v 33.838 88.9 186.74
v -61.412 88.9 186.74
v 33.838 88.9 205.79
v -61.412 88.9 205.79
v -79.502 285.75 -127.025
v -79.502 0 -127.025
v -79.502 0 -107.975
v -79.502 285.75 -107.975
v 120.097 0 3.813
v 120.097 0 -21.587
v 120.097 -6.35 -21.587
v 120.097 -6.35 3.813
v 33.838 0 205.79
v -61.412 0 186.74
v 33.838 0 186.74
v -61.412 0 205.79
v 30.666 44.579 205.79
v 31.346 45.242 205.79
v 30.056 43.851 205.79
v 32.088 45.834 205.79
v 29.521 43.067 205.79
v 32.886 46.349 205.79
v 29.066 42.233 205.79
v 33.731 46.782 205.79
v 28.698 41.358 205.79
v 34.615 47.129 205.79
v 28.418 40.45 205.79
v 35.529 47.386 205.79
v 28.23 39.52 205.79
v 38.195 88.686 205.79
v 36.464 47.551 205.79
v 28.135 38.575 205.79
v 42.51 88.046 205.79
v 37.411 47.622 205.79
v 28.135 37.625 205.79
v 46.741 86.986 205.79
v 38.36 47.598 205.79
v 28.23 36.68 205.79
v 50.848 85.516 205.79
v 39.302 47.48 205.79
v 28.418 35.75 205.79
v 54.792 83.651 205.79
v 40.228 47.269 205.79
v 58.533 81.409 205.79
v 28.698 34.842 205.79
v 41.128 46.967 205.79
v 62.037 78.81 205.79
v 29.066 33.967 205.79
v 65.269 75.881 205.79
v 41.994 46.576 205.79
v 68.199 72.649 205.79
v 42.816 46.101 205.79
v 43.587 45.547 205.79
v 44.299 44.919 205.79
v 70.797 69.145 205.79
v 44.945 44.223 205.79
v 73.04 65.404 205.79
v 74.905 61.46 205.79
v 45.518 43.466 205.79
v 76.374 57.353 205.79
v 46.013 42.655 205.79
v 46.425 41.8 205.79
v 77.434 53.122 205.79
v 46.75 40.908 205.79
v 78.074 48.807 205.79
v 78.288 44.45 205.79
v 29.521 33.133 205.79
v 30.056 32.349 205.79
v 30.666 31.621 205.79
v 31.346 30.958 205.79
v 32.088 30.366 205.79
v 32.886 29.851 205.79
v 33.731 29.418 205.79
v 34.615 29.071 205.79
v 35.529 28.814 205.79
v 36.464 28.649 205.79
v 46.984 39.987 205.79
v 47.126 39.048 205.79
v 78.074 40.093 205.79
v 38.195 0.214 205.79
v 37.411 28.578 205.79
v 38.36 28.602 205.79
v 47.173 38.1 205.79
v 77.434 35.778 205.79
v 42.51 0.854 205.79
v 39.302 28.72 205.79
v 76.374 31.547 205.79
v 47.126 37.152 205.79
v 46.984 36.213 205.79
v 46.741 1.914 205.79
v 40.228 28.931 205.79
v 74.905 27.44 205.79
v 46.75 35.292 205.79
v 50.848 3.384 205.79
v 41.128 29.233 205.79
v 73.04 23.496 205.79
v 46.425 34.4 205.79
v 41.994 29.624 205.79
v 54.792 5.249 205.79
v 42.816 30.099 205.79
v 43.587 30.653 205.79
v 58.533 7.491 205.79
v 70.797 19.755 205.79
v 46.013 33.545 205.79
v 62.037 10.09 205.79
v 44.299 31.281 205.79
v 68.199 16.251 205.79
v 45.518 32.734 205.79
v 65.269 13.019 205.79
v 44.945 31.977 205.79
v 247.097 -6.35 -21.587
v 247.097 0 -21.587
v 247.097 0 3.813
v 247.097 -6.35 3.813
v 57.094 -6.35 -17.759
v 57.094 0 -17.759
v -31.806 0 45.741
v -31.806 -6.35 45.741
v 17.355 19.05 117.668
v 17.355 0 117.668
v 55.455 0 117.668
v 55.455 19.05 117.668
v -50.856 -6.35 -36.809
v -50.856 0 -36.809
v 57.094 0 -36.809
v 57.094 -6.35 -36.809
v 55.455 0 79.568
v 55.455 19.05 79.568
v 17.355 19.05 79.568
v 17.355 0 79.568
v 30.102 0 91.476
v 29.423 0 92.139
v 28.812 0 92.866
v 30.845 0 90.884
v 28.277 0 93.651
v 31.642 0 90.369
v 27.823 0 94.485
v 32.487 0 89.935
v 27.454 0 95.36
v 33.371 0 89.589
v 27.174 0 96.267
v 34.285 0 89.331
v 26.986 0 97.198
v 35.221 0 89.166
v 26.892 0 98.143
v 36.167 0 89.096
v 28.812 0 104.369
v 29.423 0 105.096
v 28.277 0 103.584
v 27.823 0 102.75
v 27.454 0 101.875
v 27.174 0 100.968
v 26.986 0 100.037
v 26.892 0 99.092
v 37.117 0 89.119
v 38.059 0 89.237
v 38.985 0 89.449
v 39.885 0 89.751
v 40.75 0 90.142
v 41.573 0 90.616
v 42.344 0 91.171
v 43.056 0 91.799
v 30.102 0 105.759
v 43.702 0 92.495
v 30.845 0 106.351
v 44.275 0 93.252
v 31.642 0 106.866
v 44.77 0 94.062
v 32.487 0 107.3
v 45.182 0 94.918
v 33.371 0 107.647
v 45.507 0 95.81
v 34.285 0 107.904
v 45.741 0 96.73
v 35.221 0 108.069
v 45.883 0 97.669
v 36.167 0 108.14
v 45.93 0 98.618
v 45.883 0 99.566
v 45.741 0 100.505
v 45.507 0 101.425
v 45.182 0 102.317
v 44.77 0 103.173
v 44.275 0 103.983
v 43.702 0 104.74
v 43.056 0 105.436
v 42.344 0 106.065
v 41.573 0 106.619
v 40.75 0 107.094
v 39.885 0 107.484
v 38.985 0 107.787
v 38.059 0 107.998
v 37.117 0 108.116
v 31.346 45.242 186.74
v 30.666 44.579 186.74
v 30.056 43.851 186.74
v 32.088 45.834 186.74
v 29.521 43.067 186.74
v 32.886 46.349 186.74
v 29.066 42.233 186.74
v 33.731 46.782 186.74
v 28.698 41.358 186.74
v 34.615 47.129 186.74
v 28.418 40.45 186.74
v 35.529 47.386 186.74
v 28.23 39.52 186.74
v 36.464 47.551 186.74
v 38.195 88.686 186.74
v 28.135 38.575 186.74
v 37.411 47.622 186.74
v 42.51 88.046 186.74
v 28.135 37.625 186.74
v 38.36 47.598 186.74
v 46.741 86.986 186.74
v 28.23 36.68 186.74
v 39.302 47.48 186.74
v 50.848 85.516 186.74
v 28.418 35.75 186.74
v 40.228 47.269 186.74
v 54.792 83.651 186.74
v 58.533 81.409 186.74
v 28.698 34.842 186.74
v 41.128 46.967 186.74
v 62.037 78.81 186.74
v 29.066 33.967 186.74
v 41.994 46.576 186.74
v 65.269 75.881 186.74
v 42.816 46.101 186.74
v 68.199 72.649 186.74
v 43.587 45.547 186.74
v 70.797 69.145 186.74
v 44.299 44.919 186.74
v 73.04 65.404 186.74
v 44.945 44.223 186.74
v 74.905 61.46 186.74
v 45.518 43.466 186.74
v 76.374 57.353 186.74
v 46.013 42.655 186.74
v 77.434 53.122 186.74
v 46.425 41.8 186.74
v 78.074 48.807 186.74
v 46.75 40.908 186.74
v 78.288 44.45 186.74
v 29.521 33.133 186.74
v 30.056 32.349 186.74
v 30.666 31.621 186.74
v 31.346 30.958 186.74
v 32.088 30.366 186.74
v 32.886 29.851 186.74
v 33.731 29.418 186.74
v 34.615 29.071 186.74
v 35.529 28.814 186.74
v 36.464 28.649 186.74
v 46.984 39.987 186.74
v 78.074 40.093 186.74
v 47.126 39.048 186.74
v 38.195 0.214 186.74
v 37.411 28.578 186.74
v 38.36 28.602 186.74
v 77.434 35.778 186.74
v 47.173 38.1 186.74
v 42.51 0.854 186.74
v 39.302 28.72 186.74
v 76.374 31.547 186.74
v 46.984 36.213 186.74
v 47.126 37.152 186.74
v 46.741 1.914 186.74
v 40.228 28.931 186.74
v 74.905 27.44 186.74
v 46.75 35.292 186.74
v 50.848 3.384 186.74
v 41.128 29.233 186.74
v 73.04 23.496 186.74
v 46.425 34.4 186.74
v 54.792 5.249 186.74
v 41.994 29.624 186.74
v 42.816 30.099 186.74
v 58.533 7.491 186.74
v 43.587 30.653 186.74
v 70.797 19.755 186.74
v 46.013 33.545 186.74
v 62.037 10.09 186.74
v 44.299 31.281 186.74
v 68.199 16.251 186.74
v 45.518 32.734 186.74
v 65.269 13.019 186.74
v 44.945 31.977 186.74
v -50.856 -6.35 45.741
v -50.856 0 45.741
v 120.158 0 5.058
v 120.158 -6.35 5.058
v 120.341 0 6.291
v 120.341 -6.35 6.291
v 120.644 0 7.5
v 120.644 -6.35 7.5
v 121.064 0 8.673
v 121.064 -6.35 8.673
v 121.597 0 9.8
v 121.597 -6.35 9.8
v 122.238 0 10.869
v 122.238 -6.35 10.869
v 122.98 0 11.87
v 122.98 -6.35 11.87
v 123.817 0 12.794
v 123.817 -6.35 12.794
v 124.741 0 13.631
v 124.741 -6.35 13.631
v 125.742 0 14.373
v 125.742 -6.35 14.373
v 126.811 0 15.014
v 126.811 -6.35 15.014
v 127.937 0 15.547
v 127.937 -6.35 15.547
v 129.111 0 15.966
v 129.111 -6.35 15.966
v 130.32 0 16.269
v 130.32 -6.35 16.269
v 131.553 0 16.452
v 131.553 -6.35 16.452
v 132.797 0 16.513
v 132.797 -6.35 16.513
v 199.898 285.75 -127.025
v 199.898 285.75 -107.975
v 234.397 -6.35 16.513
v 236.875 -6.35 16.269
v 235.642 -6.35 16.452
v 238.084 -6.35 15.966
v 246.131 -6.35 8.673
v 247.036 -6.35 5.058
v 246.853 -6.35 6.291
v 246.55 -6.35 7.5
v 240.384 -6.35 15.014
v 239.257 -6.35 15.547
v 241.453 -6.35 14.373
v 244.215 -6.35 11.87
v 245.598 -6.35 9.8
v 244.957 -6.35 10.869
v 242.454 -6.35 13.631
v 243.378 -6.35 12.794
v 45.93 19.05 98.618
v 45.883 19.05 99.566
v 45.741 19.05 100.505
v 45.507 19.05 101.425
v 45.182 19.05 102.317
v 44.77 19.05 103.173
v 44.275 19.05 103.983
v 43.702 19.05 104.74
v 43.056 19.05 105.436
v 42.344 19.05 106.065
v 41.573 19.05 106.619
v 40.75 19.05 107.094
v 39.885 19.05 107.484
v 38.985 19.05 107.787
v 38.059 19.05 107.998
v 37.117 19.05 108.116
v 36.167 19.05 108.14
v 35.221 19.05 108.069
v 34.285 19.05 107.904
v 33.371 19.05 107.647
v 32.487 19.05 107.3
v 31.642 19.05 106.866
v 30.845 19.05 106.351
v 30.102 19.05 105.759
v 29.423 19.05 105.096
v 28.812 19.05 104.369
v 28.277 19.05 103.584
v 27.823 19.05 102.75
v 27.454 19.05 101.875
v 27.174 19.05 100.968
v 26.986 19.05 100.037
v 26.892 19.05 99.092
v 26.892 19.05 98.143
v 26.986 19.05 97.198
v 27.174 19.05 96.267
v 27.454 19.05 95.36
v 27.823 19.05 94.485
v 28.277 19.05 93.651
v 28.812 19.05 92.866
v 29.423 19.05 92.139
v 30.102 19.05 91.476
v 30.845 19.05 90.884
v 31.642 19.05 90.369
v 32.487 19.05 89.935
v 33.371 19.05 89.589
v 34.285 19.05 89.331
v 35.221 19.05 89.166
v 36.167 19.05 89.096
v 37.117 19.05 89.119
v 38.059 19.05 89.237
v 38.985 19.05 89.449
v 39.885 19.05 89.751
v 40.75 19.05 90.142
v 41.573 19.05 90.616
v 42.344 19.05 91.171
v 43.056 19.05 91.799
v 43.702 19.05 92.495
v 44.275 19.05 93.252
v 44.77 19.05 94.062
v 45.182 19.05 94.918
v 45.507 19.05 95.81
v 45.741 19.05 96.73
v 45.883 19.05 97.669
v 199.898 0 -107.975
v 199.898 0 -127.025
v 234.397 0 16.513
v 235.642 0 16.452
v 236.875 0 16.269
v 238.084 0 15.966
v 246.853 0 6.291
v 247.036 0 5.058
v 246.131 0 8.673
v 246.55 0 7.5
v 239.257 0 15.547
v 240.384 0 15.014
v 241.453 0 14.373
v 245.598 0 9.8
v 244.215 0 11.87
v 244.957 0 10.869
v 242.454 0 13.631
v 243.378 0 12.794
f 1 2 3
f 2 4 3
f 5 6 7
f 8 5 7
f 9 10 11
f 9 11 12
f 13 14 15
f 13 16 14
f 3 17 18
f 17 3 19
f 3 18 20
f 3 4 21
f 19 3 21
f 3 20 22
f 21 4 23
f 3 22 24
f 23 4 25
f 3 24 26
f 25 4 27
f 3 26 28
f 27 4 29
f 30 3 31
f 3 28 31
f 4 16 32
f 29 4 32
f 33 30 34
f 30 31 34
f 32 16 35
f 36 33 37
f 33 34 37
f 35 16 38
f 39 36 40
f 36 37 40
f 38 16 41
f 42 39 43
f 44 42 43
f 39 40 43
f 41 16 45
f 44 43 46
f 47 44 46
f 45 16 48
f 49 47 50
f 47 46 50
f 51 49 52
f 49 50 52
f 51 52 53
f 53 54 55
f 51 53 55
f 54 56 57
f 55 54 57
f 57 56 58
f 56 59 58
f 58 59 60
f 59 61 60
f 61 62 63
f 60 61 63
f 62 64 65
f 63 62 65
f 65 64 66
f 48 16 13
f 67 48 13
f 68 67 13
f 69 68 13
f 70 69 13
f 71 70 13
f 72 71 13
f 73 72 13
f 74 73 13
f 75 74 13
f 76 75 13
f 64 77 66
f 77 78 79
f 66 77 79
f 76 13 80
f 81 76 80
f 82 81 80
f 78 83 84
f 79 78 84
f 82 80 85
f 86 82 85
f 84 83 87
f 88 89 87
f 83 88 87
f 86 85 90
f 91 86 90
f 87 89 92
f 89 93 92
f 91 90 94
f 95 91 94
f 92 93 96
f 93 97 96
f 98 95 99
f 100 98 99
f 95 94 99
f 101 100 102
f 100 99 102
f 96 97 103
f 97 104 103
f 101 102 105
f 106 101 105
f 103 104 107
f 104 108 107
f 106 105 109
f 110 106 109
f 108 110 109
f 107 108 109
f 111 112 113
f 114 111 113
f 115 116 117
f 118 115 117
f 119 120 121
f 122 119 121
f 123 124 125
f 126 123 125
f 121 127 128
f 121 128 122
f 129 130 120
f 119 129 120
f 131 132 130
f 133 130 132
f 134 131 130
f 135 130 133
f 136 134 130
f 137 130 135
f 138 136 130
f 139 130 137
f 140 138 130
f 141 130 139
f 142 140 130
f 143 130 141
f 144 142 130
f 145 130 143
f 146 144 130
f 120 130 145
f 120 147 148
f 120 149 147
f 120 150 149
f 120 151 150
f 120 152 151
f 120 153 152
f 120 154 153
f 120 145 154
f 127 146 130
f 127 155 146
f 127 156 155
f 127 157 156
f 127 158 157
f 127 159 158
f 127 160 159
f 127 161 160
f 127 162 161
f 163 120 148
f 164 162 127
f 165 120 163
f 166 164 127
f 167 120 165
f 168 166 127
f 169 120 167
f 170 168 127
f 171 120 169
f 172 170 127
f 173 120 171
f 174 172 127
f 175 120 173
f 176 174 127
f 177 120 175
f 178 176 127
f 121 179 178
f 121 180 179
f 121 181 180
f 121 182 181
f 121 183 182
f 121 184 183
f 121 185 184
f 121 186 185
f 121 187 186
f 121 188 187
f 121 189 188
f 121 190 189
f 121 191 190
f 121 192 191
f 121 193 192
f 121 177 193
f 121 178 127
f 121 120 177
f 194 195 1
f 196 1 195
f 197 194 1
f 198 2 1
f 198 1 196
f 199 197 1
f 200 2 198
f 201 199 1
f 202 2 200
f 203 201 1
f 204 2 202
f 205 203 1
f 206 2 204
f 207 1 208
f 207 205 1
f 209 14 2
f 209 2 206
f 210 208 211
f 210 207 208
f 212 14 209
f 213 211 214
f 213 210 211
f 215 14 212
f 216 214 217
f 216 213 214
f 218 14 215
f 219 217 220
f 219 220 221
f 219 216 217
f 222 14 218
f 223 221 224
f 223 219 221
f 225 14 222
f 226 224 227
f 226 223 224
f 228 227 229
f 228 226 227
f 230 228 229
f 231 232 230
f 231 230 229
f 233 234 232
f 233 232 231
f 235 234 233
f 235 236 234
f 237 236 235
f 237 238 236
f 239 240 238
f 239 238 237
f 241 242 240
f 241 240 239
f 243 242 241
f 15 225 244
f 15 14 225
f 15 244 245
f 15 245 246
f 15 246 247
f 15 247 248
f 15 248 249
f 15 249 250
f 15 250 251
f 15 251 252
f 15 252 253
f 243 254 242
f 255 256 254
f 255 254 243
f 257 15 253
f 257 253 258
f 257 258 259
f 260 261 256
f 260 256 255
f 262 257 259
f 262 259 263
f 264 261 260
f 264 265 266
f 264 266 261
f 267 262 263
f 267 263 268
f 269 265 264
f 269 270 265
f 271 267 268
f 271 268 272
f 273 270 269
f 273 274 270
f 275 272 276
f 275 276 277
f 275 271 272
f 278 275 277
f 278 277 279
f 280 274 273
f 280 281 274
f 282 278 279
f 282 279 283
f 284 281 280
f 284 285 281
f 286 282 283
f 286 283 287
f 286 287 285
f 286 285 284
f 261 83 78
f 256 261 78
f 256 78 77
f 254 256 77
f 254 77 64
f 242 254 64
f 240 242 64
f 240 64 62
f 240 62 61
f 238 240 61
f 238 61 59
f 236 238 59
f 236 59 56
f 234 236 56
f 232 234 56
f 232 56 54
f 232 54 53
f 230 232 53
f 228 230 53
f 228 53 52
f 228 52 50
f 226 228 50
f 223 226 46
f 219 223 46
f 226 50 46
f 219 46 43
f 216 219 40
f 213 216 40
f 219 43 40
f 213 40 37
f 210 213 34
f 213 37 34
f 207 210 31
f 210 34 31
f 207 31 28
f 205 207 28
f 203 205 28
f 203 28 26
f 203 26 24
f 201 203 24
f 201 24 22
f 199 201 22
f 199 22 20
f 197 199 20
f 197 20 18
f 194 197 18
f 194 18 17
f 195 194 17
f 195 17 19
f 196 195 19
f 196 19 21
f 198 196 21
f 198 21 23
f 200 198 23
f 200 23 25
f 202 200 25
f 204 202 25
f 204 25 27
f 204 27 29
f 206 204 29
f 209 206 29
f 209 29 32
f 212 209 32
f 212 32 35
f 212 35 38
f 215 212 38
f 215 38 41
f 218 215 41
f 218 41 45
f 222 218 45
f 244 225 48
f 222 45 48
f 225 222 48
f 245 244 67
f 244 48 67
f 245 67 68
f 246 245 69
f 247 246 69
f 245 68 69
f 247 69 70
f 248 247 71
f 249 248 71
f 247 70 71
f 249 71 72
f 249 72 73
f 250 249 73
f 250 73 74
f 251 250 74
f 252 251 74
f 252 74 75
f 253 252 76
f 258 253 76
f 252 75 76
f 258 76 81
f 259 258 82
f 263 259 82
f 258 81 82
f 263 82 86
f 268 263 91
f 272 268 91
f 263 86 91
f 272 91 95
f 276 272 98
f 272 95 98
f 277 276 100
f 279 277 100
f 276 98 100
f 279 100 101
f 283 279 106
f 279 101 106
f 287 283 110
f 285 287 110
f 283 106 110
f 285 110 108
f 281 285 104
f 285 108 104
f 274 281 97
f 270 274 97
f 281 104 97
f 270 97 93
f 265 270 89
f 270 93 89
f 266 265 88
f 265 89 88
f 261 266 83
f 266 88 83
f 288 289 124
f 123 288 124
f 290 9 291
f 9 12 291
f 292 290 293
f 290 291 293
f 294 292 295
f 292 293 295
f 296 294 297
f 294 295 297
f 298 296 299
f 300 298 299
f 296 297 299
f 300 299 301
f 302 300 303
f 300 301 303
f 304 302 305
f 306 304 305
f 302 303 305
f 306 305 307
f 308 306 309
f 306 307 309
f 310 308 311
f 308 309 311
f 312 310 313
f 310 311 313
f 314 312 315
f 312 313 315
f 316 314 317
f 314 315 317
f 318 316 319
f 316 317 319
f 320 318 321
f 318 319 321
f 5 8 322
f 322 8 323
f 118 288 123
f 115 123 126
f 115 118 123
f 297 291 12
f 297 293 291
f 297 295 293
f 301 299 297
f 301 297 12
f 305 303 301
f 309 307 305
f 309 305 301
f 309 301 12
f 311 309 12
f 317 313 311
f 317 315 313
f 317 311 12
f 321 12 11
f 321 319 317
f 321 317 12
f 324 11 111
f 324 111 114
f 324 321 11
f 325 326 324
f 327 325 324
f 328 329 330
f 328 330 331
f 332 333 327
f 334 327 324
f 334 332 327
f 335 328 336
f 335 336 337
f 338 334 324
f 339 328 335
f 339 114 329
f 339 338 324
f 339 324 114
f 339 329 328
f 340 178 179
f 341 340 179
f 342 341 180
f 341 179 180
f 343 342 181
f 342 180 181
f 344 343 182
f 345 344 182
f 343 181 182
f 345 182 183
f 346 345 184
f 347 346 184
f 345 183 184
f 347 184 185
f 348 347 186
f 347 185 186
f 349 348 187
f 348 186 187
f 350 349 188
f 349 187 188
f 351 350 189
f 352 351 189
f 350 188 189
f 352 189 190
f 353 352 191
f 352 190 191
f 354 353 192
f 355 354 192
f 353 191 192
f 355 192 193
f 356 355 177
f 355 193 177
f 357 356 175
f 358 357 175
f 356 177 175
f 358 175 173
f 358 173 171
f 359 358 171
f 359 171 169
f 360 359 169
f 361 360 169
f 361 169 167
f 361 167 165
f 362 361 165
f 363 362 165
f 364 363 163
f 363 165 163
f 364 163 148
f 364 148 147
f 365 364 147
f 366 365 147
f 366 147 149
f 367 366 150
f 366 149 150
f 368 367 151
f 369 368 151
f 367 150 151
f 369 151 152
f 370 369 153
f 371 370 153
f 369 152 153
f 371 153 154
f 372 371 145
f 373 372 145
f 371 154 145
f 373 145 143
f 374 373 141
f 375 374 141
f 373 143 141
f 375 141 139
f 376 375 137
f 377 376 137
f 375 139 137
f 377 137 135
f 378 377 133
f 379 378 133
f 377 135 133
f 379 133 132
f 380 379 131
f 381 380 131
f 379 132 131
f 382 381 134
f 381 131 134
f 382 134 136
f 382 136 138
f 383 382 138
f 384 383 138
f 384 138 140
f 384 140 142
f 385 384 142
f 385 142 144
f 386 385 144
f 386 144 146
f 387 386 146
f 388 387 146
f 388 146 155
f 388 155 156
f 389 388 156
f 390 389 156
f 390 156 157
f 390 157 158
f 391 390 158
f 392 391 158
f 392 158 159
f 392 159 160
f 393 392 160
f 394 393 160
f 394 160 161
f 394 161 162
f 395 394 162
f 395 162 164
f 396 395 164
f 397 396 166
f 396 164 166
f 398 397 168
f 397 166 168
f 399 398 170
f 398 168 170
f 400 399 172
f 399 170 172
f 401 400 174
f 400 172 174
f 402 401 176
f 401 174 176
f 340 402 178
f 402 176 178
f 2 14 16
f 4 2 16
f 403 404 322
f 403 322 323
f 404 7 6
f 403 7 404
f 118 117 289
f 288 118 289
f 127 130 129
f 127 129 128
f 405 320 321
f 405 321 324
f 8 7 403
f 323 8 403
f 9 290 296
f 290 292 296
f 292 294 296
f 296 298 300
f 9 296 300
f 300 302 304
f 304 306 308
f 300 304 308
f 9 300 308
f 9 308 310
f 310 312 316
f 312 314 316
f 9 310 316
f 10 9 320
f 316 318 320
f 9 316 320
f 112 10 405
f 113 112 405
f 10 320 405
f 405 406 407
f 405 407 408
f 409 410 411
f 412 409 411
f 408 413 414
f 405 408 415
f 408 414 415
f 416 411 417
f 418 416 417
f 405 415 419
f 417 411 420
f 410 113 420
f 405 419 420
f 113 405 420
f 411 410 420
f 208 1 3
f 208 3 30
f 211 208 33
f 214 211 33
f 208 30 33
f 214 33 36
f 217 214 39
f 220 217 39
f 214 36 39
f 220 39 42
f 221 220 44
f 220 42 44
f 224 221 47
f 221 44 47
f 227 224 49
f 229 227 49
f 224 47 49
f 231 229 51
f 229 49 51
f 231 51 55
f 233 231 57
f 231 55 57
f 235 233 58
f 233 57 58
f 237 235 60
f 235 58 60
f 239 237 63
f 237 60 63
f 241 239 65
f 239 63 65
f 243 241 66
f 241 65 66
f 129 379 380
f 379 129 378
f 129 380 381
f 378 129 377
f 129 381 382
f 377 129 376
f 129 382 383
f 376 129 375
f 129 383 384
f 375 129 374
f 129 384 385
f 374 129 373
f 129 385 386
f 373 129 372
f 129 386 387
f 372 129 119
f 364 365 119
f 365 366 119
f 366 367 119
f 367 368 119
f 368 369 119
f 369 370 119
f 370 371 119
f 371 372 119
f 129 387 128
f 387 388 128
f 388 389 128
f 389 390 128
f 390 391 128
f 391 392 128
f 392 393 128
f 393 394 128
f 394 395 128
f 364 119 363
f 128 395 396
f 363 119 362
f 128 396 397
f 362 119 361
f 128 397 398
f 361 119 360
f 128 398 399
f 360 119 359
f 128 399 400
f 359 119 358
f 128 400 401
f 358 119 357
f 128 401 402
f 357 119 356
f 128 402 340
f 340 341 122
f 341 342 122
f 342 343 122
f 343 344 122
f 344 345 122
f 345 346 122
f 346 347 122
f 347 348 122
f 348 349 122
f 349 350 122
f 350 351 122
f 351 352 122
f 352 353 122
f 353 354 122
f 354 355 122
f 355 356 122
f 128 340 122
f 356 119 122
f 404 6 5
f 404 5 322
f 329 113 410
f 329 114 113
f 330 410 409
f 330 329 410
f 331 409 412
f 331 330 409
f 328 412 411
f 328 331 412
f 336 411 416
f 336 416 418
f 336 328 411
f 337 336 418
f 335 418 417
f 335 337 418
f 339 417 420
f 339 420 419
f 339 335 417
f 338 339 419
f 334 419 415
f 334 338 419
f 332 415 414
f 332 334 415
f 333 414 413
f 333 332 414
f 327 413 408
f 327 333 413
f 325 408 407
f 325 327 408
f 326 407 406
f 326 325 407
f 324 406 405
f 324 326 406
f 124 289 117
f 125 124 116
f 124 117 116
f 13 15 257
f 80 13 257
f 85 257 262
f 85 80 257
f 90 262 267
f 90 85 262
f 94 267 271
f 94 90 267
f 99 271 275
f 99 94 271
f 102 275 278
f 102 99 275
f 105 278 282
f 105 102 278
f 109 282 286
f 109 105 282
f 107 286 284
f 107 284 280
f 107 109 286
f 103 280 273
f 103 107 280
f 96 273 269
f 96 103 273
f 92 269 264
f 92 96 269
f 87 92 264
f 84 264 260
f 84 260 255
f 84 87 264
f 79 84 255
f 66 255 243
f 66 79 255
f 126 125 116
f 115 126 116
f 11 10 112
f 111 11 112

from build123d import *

# Parameters (mm, degrees)
F1_DEPTH  = 6.35
F2_W      = 127
F2_H      = 38.1
F3_DEPTH  = 6.35
F4_R      = 12.7
F5_W      = 279.4
F5_H      = 19.05
F6_DEPTH  = 285.75
F7_W      = 38.1
F7_H      = 38.1
F7_R      = 9.525
F8_DEPTH  = 19.05
F9_W      = 139.7
F9_H      = 19.05
F10_DEPTH = 88.9
F11_R     = 9.525
F12_DEPTH = 76.2
F13_R     = 44.44999


# Not quite as in the source:
# - a fillet or chamfer is up to 0.001 mm smaller than in the source, because OpenCascade refuses the exact size


with BuildPart() as f1:
    # F0 (on Front) → F1 (new body)
    with BuildSketch(Plane.XZ):
        Polygon((-31.8063910506, 45.7410294402), (-50.8563910506, 45.7410294402), (-50.8563910506, -36.8089705598), (57.0936089494, -36.8089705598), (57.0936089494, -17.7589705598), align=None)
    extrude(amount=F1_DEPTH)


with BuildPart() as f3:
    # F2 (on Front) → F3 (new body)
    with BuildSketch(Plane.XZ):
        with Locations((183.5973408857, -2.5366649497)):
            Rectangle(F2_W, F2_H)
    extrude(amount=F3_DEPTH)

    # F4
    f4_edges = [f3.edges().sort_by_distance(p)[0] for p in [
        (120.097341, -3.175, 16.513335),
        (247.097341, -3.175, 16.513335),
    ]]
    fillet(f4_edges, radius=F4_R)


with BuildPart() as f6:
    # F5 (on Front) → F6 (new body)
    with BuildSketch(Plane.XZ):
        with Locations((60.1978264749, -117.5000589487)):
            Rectangle(F5_W, F5_H)
    extrude(amount=-F6_DEPTH)


with BuildPart() as f8:
    # F7 (on Front) → F8 (new body)
    with BuildSketch(Plane.XZ):
        with Locations((36.4049384925, 98.6175760627)):
            Rectangle(F7_W, F7_H)
        with Locations((36.4049384925, 98.6175760627)):
            Circle(F7_R, mode=Mode.SUBTRACT)
    extrude(amount=-F8_DEPTH)


with BuildPart() as f10:
    # F9 (on Front) → F10 (new body)
    with BuildSketch(Plane.XZ):
        with Locations((8.4381951019, 196.2650863438)):
            Rectangle(F9_W, F9_H)
    extrude(amount=-F10_DEPTH)

    # F11 (on face) → F12 (cut)
    with BuildSketch(Plane.XY.offset(205.7900863438)):
        with Locations((37.6481951019, 38.1)):
            Circle(F11_R)
    extrude(amount=-F12_DEPTH, mode=Mode.SUBTRACT)

    # F13 (radius 44.45 in the source; OpenCascade refuses exactly that, so slightly less here)
    f13_edges = [f10.edges().sort_by_distance(p)[0] for p in [
        (78.288195, 0, 196.265086),
        (78.288195, 88.9, 196.265086),
    ]]
    fillet(f13_edges, radius=F13_R)


solid = Compound([f1.part, f3.part, f6.part, f8.part, f10.part])
